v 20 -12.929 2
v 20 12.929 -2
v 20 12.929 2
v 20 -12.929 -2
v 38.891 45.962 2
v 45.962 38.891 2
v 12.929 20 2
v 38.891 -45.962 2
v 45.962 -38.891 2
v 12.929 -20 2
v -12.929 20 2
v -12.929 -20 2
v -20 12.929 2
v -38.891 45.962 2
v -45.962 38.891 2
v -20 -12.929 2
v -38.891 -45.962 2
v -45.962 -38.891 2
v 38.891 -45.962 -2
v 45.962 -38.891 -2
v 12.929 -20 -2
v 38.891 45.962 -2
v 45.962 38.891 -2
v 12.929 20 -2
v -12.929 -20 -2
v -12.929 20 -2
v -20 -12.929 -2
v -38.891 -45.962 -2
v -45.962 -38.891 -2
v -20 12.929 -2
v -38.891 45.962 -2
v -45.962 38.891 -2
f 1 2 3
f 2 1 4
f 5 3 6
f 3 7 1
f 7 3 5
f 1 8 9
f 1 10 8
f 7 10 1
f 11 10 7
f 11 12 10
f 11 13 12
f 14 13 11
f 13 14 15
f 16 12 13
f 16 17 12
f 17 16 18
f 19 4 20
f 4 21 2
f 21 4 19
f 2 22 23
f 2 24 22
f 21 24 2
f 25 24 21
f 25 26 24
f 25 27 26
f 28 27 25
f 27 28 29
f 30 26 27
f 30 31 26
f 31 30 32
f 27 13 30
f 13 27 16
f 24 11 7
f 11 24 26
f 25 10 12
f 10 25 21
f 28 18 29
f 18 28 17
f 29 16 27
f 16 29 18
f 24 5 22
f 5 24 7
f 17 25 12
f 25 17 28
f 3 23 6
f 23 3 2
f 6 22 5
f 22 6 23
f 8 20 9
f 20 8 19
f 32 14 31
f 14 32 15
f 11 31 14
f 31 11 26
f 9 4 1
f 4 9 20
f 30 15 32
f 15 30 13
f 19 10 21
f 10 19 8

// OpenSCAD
// GestureFly Quadcopter Frame (simple X frame)
arm=120;
thick=4;
center=40;

union(){
    cube([center,center,thick],center=true);

    rotate([0,0,45]) cube([arm,10,thick],center=true);
    rotate([0,0,-45]) cube([arm,10,thick],center=true);
}
